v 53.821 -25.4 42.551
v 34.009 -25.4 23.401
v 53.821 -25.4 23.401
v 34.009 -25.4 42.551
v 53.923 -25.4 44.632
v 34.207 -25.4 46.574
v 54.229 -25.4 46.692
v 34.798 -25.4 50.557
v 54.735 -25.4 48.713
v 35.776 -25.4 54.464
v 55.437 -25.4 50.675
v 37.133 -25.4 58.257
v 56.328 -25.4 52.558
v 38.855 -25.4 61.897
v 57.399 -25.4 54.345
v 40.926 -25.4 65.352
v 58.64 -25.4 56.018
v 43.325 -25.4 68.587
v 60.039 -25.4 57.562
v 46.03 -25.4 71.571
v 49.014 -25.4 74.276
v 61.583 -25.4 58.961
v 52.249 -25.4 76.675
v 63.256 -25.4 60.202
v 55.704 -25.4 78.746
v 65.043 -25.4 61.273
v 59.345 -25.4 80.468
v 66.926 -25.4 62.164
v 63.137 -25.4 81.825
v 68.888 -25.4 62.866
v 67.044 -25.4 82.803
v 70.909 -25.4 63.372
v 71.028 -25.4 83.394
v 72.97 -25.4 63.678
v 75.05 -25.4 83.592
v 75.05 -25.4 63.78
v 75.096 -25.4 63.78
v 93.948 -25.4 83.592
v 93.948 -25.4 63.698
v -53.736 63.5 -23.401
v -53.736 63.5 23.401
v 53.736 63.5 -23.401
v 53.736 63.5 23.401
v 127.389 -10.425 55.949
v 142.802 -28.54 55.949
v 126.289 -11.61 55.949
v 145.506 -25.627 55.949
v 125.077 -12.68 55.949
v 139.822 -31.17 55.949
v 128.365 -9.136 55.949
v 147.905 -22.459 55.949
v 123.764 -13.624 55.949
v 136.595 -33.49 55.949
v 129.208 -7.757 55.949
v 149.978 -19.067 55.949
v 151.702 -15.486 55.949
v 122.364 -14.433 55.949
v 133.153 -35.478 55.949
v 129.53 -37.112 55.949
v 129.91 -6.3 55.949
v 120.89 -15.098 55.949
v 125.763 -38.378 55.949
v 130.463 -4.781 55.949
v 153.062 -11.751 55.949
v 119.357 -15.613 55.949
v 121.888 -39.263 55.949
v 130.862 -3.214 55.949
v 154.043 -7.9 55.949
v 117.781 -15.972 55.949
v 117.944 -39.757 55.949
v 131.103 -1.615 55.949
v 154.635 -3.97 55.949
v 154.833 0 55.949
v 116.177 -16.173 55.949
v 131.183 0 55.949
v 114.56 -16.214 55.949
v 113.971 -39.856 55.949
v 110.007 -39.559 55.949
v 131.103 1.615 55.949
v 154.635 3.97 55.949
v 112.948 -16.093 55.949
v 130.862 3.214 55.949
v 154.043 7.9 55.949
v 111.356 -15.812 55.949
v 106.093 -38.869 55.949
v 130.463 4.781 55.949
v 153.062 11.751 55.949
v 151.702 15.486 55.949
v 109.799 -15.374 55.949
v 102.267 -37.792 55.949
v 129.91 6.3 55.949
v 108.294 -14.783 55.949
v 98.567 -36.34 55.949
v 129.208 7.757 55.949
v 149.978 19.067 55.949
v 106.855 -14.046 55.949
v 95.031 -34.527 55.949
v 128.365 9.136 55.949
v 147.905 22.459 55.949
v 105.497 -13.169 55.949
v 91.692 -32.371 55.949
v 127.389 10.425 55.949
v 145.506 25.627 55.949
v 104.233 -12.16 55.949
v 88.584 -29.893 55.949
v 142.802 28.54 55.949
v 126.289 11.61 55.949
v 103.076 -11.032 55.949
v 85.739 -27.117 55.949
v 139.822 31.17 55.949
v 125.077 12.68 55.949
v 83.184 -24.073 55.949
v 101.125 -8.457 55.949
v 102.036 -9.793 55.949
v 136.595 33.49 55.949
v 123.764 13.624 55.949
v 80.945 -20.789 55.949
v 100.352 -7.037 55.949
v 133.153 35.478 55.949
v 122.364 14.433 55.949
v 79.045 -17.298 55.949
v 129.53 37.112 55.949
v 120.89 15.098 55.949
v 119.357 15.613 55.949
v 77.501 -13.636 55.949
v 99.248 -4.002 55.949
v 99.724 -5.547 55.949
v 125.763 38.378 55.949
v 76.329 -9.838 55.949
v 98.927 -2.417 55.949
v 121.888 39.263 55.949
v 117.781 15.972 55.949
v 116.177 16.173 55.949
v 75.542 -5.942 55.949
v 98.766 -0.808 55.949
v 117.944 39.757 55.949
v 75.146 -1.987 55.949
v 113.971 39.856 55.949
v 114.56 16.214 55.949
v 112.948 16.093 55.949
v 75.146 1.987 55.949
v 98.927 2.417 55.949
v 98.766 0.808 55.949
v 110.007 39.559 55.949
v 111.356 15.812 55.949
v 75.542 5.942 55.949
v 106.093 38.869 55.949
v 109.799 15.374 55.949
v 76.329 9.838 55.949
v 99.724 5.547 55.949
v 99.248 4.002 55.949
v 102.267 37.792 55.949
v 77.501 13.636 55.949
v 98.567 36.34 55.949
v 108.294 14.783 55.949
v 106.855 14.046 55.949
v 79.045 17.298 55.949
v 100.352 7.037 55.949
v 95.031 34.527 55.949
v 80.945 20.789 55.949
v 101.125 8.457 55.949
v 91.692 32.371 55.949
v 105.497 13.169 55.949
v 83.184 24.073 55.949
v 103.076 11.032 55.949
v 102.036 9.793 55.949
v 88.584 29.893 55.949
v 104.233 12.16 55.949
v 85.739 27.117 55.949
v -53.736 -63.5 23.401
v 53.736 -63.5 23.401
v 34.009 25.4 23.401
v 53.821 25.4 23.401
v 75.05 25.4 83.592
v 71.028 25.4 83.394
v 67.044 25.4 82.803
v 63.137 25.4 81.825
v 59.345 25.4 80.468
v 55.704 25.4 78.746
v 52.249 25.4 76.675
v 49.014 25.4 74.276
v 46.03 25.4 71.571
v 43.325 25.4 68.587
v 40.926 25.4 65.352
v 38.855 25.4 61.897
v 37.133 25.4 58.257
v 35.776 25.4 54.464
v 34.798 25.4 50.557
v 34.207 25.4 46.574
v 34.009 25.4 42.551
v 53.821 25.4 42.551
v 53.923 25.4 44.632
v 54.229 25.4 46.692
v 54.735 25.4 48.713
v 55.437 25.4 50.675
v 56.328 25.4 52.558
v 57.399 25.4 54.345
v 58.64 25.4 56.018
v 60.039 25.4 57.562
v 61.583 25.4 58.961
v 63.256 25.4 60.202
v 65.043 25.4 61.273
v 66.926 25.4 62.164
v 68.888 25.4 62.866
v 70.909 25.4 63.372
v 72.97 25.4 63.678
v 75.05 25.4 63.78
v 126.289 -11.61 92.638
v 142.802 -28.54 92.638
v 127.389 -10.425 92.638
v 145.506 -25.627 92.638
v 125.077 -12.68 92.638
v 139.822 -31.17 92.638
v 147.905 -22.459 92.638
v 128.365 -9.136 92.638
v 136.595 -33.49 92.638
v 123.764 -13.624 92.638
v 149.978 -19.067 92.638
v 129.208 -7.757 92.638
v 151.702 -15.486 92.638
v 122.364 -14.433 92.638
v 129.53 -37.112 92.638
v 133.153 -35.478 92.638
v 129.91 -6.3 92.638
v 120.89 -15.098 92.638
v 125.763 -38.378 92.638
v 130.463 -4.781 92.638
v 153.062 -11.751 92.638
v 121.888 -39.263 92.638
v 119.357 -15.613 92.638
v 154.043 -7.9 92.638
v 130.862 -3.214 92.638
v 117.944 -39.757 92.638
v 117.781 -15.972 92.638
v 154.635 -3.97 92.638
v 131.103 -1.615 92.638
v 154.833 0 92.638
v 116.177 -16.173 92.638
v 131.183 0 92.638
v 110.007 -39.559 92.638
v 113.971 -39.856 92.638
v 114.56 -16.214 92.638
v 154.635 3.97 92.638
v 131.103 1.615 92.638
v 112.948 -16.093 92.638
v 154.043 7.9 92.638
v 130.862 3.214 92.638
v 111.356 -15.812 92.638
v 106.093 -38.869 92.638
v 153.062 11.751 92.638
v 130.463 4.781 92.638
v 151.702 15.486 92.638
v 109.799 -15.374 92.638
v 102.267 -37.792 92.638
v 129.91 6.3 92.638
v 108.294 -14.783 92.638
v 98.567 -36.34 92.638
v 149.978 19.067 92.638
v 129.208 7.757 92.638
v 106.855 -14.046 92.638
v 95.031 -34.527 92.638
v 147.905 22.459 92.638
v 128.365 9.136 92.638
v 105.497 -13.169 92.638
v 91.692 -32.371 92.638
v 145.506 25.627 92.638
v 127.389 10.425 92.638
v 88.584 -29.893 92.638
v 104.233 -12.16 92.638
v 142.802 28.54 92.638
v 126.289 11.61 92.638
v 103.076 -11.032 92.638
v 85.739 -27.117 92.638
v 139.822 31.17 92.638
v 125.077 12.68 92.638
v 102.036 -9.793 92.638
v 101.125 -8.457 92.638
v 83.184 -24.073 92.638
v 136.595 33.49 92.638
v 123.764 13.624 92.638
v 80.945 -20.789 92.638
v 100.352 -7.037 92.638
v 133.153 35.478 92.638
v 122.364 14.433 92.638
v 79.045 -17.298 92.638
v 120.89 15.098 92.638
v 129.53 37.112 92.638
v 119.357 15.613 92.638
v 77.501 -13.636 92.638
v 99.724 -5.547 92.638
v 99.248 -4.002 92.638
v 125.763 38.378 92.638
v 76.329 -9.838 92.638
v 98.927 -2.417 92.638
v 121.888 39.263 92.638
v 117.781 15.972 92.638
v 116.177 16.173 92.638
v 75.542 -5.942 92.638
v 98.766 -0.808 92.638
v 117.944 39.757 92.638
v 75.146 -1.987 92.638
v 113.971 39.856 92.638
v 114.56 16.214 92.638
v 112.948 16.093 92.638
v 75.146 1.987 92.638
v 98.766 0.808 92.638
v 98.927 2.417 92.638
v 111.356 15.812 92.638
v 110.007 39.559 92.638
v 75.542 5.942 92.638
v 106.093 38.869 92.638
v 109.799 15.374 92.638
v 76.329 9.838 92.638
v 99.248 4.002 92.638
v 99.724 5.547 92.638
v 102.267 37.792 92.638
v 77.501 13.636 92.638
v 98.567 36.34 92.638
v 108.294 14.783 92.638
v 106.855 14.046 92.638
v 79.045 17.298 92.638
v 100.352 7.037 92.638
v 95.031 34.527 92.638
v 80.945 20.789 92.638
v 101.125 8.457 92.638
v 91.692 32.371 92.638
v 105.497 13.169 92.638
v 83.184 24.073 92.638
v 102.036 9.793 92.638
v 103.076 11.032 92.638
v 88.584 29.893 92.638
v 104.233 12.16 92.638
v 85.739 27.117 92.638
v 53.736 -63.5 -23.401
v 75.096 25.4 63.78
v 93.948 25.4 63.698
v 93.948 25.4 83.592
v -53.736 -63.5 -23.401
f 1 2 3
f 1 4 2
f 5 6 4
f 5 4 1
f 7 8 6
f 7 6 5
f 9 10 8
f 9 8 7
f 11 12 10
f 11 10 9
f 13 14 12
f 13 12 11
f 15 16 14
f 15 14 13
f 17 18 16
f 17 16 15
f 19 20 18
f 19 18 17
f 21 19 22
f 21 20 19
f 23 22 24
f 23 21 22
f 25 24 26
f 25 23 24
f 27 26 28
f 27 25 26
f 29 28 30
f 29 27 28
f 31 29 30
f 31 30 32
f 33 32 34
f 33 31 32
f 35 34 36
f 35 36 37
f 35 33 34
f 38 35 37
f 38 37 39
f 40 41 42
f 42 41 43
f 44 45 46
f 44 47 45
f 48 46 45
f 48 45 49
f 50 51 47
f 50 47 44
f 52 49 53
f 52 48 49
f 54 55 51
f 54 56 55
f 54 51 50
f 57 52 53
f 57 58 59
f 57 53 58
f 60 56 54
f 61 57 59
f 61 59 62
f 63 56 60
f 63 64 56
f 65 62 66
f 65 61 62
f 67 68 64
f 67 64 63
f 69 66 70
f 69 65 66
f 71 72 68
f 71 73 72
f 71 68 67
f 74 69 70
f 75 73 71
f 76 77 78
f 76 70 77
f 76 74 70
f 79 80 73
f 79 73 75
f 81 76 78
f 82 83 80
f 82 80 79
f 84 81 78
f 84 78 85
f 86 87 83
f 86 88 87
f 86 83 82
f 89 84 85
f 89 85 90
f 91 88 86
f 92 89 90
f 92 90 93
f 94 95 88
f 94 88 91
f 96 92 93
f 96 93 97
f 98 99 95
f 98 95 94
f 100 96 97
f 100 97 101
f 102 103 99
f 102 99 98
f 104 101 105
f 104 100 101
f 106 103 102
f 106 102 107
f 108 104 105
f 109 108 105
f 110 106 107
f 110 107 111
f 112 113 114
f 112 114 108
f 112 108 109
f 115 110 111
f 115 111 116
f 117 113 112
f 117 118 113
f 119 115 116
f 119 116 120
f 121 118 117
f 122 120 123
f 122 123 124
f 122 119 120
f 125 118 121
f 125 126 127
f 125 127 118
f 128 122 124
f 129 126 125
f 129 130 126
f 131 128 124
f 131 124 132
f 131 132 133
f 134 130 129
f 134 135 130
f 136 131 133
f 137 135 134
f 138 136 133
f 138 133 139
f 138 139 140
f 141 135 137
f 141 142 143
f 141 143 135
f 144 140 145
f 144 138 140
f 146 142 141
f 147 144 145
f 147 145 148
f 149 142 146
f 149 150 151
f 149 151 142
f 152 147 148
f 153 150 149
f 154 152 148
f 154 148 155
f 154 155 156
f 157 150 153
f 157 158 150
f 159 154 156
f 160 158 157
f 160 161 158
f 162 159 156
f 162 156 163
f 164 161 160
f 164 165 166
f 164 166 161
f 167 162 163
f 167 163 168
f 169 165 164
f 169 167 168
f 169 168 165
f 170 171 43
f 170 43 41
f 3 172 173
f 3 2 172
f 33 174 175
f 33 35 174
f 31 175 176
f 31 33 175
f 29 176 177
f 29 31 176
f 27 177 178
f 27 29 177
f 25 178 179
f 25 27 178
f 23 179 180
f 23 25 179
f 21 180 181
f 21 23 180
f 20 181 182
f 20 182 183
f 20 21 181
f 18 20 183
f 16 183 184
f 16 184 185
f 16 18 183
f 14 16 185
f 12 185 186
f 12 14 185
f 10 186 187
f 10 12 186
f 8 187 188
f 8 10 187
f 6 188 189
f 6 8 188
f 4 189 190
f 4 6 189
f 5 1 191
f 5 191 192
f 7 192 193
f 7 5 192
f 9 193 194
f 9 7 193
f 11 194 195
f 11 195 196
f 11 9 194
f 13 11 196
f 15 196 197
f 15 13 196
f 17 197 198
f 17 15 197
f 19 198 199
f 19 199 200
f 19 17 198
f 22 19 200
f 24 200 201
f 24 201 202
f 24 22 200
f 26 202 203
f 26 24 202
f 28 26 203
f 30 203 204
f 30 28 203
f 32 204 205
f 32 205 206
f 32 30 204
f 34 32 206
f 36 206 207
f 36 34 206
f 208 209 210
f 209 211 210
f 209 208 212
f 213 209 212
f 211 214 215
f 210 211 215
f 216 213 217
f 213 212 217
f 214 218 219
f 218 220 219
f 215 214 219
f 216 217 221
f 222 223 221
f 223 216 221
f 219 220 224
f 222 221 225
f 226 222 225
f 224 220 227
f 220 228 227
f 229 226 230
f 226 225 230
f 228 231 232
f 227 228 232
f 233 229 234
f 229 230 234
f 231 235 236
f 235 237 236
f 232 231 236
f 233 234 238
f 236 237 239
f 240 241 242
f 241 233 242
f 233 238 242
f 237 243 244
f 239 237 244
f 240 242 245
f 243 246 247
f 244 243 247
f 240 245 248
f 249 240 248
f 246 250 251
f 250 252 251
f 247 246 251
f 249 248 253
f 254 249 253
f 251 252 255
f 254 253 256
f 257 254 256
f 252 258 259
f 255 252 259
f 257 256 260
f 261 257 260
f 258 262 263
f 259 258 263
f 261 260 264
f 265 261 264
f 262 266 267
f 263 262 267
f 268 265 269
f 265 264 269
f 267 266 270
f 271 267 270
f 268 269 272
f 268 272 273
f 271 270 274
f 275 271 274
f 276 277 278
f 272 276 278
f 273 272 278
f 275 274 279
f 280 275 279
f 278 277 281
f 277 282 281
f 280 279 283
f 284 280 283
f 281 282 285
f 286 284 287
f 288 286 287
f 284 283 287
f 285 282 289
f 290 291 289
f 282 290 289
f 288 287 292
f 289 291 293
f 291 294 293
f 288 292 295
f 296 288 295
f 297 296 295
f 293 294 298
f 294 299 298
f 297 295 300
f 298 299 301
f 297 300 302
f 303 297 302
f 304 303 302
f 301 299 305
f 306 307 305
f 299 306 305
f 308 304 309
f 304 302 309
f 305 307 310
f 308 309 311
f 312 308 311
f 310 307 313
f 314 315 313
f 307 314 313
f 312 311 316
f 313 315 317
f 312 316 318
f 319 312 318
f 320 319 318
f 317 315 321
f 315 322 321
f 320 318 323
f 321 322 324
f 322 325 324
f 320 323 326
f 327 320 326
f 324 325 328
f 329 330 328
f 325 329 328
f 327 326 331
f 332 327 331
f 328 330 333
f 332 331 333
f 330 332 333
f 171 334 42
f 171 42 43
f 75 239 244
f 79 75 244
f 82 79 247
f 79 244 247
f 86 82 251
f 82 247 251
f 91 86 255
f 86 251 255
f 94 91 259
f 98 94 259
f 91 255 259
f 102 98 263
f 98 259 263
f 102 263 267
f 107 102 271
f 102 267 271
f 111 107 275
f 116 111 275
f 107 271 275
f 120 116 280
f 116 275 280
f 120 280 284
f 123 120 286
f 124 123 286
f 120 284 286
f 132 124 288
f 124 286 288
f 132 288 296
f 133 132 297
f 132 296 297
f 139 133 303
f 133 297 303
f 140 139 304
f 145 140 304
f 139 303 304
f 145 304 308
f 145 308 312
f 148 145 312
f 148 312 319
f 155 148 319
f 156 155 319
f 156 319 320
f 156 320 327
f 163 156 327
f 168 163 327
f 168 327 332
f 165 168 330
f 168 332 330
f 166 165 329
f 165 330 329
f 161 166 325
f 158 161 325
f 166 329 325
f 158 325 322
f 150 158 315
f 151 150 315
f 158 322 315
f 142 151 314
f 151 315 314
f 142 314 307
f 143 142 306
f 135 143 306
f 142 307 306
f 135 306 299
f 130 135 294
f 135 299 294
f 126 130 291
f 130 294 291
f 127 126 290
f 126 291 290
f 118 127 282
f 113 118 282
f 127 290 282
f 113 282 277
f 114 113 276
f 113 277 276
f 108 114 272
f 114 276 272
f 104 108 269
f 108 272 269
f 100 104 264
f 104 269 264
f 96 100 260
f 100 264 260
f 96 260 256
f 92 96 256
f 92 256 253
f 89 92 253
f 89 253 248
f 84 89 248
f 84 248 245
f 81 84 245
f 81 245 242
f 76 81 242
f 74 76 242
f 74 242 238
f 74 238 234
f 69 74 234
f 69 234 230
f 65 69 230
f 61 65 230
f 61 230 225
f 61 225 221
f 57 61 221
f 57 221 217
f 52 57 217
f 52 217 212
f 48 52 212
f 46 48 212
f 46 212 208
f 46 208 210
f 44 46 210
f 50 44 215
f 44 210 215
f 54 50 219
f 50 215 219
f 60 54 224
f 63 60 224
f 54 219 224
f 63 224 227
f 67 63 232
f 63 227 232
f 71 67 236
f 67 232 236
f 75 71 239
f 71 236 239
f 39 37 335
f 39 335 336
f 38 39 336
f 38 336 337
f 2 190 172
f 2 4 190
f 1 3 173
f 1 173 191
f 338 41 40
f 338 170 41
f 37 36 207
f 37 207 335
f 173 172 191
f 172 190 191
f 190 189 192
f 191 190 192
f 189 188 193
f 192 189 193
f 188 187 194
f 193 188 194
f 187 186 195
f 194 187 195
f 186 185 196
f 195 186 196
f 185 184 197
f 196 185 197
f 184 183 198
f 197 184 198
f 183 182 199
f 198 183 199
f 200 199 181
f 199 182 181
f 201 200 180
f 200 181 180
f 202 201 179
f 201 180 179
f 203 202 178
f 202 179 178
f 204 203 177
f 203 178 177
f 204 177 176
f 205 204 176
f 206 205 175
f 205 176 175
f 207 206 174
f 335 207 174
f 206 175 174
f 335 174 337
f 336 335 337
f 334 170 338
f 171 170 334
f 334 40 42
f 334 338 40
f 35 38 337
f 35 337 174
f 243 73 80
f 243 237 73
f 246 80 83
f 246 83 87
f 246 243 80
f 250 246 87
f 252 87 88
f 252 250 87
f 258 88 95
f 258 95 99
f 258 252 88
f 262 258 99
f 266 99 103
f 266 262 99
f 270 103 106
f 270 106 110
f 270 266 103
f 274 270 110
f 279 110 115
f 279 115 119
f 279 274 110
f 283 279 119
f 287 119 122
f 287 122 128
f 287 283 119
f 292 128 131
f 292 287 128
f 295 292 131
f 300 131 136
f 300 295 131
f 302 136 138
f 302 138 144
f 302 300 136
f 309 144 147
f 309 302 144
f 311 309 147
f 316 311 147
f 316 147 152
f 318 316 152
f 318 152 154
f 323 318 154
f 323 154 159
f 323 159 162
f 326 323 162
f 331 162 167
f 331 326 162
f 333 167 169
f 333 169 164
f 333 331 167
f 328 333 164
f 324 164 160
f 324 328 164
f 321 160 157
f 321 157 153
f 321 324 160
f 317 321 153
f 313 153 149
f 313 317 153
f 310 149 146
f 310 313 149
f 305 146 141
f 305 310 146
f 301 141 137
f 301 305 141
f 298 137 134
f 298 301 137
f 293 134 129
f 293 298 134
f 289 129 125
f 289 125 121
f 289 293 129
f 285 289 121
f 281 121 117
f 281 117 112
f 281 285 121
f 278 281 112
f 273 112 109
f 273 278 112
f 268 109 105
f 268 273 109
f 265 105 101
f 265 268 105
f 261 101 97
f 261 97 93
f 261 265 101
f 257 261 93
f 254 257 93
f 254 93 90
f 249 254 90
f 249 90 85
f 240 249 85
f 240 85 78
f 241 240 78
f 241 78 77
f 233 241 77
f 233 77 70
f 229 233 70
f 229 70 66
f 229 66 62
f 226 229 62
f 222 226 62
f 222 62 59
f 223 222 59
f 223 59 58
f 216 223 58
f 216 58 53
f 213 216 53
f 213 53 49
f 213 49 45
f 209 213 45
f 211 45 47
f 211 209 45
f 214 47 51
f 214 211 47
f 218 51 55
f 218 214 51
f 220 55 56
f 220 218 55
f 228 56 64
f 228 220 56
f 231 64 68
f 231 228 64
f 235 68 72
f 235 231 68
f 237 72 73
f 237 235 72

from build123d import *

# Parameters (mm, degrees)
F1_DEPTH = 63.5
F2_DEPTH = 25.4
F0_W     = 39.8683473468
F0_H     = 36.688753669
F4_R     = 16.2187232802
F5_DEPTH = 36.688753669


with BuildPart() as f1:
    # F0 (on Front) → F1 (new body, symmetric)
    with BuildSketch(Plane.XZ):
        Polygon((-53.7355877459, -23.4009865671), (53.7355877459, -23.4009865671), (53.7355877459, 23.4009865671), (34.0091888793, 23.4009865671), (-53.7355877459, 23.4009865671), align=None)
    extrude(amount=F1_DEPTH, both=True)


with BuildPart() as f2:
    # F0 (on Front) → F2 (new body, symmetric)
    with BuildSketch(Plane.XZ):
        with BuildLine():
            Line((34.0091888793, 23.4009865671), (53.7355877459, 23.4009865671))
            Line((53.7355877459, 23.4009865671), (53.821187932, 23.4009865671))
            Line((53.821187932, 23.4009865671), (53.821187932, 42.5507634298))
            ThreePointArc((53.821187932, 42.5507634298), (60.0390651231, 57.5620468738), (75.0503485671, 63.7799240649))
            Line((75.0503485671, 63.7799240649), (75.096371118, 63.7799240649))
            Line((75.096371118, 63.7799240649), (75.096371118, 83.5919231176))
            Line((75.096371118, 83.5919231176), (75.0503485671, 83.5919231176))
            ThreePointArc((75.0503485671, 83.5919231176), (46.0298662441, 71.5712457528), (34.0091888793, 42.5507634298))
            Line((34.0091888793, 42.5507634298), (34.0091888793, 23.4009865671))
        make_face()
        Polygon((93.9475916658, 83.5919231176), (75.096371118, 83.5919231176), (75.096371118, 63.7799240649), (93.9475916658, 63.6981888188), align=None)
    extrude(amount=F2_DEPTH, both=True)


with BuildPart() as f3:
    # F0 (on Front) → F3 (revolve)
    with BuildSketch(Plane.XZ):
        with Locations((134.8988921382, 74.2934830487)):
            Rectangle(F0_W, F0_H)
    revolve(axis=Axis((114.9647184648, 0, 74.2934830487), (0, 0, 1)))

    # F4 (on face) → F5 (cut, through all)
    with BuildSketch(Plane.XY.offset(92.6378598832)):
        with Locations((114.9647184648, 0)):
            Circle(F4_R)
    extrude(amount=-F5_DEPTH, mode=Mode.SUBTRACT)


solid = Compound([f1.part, f2.part, f3.part])
